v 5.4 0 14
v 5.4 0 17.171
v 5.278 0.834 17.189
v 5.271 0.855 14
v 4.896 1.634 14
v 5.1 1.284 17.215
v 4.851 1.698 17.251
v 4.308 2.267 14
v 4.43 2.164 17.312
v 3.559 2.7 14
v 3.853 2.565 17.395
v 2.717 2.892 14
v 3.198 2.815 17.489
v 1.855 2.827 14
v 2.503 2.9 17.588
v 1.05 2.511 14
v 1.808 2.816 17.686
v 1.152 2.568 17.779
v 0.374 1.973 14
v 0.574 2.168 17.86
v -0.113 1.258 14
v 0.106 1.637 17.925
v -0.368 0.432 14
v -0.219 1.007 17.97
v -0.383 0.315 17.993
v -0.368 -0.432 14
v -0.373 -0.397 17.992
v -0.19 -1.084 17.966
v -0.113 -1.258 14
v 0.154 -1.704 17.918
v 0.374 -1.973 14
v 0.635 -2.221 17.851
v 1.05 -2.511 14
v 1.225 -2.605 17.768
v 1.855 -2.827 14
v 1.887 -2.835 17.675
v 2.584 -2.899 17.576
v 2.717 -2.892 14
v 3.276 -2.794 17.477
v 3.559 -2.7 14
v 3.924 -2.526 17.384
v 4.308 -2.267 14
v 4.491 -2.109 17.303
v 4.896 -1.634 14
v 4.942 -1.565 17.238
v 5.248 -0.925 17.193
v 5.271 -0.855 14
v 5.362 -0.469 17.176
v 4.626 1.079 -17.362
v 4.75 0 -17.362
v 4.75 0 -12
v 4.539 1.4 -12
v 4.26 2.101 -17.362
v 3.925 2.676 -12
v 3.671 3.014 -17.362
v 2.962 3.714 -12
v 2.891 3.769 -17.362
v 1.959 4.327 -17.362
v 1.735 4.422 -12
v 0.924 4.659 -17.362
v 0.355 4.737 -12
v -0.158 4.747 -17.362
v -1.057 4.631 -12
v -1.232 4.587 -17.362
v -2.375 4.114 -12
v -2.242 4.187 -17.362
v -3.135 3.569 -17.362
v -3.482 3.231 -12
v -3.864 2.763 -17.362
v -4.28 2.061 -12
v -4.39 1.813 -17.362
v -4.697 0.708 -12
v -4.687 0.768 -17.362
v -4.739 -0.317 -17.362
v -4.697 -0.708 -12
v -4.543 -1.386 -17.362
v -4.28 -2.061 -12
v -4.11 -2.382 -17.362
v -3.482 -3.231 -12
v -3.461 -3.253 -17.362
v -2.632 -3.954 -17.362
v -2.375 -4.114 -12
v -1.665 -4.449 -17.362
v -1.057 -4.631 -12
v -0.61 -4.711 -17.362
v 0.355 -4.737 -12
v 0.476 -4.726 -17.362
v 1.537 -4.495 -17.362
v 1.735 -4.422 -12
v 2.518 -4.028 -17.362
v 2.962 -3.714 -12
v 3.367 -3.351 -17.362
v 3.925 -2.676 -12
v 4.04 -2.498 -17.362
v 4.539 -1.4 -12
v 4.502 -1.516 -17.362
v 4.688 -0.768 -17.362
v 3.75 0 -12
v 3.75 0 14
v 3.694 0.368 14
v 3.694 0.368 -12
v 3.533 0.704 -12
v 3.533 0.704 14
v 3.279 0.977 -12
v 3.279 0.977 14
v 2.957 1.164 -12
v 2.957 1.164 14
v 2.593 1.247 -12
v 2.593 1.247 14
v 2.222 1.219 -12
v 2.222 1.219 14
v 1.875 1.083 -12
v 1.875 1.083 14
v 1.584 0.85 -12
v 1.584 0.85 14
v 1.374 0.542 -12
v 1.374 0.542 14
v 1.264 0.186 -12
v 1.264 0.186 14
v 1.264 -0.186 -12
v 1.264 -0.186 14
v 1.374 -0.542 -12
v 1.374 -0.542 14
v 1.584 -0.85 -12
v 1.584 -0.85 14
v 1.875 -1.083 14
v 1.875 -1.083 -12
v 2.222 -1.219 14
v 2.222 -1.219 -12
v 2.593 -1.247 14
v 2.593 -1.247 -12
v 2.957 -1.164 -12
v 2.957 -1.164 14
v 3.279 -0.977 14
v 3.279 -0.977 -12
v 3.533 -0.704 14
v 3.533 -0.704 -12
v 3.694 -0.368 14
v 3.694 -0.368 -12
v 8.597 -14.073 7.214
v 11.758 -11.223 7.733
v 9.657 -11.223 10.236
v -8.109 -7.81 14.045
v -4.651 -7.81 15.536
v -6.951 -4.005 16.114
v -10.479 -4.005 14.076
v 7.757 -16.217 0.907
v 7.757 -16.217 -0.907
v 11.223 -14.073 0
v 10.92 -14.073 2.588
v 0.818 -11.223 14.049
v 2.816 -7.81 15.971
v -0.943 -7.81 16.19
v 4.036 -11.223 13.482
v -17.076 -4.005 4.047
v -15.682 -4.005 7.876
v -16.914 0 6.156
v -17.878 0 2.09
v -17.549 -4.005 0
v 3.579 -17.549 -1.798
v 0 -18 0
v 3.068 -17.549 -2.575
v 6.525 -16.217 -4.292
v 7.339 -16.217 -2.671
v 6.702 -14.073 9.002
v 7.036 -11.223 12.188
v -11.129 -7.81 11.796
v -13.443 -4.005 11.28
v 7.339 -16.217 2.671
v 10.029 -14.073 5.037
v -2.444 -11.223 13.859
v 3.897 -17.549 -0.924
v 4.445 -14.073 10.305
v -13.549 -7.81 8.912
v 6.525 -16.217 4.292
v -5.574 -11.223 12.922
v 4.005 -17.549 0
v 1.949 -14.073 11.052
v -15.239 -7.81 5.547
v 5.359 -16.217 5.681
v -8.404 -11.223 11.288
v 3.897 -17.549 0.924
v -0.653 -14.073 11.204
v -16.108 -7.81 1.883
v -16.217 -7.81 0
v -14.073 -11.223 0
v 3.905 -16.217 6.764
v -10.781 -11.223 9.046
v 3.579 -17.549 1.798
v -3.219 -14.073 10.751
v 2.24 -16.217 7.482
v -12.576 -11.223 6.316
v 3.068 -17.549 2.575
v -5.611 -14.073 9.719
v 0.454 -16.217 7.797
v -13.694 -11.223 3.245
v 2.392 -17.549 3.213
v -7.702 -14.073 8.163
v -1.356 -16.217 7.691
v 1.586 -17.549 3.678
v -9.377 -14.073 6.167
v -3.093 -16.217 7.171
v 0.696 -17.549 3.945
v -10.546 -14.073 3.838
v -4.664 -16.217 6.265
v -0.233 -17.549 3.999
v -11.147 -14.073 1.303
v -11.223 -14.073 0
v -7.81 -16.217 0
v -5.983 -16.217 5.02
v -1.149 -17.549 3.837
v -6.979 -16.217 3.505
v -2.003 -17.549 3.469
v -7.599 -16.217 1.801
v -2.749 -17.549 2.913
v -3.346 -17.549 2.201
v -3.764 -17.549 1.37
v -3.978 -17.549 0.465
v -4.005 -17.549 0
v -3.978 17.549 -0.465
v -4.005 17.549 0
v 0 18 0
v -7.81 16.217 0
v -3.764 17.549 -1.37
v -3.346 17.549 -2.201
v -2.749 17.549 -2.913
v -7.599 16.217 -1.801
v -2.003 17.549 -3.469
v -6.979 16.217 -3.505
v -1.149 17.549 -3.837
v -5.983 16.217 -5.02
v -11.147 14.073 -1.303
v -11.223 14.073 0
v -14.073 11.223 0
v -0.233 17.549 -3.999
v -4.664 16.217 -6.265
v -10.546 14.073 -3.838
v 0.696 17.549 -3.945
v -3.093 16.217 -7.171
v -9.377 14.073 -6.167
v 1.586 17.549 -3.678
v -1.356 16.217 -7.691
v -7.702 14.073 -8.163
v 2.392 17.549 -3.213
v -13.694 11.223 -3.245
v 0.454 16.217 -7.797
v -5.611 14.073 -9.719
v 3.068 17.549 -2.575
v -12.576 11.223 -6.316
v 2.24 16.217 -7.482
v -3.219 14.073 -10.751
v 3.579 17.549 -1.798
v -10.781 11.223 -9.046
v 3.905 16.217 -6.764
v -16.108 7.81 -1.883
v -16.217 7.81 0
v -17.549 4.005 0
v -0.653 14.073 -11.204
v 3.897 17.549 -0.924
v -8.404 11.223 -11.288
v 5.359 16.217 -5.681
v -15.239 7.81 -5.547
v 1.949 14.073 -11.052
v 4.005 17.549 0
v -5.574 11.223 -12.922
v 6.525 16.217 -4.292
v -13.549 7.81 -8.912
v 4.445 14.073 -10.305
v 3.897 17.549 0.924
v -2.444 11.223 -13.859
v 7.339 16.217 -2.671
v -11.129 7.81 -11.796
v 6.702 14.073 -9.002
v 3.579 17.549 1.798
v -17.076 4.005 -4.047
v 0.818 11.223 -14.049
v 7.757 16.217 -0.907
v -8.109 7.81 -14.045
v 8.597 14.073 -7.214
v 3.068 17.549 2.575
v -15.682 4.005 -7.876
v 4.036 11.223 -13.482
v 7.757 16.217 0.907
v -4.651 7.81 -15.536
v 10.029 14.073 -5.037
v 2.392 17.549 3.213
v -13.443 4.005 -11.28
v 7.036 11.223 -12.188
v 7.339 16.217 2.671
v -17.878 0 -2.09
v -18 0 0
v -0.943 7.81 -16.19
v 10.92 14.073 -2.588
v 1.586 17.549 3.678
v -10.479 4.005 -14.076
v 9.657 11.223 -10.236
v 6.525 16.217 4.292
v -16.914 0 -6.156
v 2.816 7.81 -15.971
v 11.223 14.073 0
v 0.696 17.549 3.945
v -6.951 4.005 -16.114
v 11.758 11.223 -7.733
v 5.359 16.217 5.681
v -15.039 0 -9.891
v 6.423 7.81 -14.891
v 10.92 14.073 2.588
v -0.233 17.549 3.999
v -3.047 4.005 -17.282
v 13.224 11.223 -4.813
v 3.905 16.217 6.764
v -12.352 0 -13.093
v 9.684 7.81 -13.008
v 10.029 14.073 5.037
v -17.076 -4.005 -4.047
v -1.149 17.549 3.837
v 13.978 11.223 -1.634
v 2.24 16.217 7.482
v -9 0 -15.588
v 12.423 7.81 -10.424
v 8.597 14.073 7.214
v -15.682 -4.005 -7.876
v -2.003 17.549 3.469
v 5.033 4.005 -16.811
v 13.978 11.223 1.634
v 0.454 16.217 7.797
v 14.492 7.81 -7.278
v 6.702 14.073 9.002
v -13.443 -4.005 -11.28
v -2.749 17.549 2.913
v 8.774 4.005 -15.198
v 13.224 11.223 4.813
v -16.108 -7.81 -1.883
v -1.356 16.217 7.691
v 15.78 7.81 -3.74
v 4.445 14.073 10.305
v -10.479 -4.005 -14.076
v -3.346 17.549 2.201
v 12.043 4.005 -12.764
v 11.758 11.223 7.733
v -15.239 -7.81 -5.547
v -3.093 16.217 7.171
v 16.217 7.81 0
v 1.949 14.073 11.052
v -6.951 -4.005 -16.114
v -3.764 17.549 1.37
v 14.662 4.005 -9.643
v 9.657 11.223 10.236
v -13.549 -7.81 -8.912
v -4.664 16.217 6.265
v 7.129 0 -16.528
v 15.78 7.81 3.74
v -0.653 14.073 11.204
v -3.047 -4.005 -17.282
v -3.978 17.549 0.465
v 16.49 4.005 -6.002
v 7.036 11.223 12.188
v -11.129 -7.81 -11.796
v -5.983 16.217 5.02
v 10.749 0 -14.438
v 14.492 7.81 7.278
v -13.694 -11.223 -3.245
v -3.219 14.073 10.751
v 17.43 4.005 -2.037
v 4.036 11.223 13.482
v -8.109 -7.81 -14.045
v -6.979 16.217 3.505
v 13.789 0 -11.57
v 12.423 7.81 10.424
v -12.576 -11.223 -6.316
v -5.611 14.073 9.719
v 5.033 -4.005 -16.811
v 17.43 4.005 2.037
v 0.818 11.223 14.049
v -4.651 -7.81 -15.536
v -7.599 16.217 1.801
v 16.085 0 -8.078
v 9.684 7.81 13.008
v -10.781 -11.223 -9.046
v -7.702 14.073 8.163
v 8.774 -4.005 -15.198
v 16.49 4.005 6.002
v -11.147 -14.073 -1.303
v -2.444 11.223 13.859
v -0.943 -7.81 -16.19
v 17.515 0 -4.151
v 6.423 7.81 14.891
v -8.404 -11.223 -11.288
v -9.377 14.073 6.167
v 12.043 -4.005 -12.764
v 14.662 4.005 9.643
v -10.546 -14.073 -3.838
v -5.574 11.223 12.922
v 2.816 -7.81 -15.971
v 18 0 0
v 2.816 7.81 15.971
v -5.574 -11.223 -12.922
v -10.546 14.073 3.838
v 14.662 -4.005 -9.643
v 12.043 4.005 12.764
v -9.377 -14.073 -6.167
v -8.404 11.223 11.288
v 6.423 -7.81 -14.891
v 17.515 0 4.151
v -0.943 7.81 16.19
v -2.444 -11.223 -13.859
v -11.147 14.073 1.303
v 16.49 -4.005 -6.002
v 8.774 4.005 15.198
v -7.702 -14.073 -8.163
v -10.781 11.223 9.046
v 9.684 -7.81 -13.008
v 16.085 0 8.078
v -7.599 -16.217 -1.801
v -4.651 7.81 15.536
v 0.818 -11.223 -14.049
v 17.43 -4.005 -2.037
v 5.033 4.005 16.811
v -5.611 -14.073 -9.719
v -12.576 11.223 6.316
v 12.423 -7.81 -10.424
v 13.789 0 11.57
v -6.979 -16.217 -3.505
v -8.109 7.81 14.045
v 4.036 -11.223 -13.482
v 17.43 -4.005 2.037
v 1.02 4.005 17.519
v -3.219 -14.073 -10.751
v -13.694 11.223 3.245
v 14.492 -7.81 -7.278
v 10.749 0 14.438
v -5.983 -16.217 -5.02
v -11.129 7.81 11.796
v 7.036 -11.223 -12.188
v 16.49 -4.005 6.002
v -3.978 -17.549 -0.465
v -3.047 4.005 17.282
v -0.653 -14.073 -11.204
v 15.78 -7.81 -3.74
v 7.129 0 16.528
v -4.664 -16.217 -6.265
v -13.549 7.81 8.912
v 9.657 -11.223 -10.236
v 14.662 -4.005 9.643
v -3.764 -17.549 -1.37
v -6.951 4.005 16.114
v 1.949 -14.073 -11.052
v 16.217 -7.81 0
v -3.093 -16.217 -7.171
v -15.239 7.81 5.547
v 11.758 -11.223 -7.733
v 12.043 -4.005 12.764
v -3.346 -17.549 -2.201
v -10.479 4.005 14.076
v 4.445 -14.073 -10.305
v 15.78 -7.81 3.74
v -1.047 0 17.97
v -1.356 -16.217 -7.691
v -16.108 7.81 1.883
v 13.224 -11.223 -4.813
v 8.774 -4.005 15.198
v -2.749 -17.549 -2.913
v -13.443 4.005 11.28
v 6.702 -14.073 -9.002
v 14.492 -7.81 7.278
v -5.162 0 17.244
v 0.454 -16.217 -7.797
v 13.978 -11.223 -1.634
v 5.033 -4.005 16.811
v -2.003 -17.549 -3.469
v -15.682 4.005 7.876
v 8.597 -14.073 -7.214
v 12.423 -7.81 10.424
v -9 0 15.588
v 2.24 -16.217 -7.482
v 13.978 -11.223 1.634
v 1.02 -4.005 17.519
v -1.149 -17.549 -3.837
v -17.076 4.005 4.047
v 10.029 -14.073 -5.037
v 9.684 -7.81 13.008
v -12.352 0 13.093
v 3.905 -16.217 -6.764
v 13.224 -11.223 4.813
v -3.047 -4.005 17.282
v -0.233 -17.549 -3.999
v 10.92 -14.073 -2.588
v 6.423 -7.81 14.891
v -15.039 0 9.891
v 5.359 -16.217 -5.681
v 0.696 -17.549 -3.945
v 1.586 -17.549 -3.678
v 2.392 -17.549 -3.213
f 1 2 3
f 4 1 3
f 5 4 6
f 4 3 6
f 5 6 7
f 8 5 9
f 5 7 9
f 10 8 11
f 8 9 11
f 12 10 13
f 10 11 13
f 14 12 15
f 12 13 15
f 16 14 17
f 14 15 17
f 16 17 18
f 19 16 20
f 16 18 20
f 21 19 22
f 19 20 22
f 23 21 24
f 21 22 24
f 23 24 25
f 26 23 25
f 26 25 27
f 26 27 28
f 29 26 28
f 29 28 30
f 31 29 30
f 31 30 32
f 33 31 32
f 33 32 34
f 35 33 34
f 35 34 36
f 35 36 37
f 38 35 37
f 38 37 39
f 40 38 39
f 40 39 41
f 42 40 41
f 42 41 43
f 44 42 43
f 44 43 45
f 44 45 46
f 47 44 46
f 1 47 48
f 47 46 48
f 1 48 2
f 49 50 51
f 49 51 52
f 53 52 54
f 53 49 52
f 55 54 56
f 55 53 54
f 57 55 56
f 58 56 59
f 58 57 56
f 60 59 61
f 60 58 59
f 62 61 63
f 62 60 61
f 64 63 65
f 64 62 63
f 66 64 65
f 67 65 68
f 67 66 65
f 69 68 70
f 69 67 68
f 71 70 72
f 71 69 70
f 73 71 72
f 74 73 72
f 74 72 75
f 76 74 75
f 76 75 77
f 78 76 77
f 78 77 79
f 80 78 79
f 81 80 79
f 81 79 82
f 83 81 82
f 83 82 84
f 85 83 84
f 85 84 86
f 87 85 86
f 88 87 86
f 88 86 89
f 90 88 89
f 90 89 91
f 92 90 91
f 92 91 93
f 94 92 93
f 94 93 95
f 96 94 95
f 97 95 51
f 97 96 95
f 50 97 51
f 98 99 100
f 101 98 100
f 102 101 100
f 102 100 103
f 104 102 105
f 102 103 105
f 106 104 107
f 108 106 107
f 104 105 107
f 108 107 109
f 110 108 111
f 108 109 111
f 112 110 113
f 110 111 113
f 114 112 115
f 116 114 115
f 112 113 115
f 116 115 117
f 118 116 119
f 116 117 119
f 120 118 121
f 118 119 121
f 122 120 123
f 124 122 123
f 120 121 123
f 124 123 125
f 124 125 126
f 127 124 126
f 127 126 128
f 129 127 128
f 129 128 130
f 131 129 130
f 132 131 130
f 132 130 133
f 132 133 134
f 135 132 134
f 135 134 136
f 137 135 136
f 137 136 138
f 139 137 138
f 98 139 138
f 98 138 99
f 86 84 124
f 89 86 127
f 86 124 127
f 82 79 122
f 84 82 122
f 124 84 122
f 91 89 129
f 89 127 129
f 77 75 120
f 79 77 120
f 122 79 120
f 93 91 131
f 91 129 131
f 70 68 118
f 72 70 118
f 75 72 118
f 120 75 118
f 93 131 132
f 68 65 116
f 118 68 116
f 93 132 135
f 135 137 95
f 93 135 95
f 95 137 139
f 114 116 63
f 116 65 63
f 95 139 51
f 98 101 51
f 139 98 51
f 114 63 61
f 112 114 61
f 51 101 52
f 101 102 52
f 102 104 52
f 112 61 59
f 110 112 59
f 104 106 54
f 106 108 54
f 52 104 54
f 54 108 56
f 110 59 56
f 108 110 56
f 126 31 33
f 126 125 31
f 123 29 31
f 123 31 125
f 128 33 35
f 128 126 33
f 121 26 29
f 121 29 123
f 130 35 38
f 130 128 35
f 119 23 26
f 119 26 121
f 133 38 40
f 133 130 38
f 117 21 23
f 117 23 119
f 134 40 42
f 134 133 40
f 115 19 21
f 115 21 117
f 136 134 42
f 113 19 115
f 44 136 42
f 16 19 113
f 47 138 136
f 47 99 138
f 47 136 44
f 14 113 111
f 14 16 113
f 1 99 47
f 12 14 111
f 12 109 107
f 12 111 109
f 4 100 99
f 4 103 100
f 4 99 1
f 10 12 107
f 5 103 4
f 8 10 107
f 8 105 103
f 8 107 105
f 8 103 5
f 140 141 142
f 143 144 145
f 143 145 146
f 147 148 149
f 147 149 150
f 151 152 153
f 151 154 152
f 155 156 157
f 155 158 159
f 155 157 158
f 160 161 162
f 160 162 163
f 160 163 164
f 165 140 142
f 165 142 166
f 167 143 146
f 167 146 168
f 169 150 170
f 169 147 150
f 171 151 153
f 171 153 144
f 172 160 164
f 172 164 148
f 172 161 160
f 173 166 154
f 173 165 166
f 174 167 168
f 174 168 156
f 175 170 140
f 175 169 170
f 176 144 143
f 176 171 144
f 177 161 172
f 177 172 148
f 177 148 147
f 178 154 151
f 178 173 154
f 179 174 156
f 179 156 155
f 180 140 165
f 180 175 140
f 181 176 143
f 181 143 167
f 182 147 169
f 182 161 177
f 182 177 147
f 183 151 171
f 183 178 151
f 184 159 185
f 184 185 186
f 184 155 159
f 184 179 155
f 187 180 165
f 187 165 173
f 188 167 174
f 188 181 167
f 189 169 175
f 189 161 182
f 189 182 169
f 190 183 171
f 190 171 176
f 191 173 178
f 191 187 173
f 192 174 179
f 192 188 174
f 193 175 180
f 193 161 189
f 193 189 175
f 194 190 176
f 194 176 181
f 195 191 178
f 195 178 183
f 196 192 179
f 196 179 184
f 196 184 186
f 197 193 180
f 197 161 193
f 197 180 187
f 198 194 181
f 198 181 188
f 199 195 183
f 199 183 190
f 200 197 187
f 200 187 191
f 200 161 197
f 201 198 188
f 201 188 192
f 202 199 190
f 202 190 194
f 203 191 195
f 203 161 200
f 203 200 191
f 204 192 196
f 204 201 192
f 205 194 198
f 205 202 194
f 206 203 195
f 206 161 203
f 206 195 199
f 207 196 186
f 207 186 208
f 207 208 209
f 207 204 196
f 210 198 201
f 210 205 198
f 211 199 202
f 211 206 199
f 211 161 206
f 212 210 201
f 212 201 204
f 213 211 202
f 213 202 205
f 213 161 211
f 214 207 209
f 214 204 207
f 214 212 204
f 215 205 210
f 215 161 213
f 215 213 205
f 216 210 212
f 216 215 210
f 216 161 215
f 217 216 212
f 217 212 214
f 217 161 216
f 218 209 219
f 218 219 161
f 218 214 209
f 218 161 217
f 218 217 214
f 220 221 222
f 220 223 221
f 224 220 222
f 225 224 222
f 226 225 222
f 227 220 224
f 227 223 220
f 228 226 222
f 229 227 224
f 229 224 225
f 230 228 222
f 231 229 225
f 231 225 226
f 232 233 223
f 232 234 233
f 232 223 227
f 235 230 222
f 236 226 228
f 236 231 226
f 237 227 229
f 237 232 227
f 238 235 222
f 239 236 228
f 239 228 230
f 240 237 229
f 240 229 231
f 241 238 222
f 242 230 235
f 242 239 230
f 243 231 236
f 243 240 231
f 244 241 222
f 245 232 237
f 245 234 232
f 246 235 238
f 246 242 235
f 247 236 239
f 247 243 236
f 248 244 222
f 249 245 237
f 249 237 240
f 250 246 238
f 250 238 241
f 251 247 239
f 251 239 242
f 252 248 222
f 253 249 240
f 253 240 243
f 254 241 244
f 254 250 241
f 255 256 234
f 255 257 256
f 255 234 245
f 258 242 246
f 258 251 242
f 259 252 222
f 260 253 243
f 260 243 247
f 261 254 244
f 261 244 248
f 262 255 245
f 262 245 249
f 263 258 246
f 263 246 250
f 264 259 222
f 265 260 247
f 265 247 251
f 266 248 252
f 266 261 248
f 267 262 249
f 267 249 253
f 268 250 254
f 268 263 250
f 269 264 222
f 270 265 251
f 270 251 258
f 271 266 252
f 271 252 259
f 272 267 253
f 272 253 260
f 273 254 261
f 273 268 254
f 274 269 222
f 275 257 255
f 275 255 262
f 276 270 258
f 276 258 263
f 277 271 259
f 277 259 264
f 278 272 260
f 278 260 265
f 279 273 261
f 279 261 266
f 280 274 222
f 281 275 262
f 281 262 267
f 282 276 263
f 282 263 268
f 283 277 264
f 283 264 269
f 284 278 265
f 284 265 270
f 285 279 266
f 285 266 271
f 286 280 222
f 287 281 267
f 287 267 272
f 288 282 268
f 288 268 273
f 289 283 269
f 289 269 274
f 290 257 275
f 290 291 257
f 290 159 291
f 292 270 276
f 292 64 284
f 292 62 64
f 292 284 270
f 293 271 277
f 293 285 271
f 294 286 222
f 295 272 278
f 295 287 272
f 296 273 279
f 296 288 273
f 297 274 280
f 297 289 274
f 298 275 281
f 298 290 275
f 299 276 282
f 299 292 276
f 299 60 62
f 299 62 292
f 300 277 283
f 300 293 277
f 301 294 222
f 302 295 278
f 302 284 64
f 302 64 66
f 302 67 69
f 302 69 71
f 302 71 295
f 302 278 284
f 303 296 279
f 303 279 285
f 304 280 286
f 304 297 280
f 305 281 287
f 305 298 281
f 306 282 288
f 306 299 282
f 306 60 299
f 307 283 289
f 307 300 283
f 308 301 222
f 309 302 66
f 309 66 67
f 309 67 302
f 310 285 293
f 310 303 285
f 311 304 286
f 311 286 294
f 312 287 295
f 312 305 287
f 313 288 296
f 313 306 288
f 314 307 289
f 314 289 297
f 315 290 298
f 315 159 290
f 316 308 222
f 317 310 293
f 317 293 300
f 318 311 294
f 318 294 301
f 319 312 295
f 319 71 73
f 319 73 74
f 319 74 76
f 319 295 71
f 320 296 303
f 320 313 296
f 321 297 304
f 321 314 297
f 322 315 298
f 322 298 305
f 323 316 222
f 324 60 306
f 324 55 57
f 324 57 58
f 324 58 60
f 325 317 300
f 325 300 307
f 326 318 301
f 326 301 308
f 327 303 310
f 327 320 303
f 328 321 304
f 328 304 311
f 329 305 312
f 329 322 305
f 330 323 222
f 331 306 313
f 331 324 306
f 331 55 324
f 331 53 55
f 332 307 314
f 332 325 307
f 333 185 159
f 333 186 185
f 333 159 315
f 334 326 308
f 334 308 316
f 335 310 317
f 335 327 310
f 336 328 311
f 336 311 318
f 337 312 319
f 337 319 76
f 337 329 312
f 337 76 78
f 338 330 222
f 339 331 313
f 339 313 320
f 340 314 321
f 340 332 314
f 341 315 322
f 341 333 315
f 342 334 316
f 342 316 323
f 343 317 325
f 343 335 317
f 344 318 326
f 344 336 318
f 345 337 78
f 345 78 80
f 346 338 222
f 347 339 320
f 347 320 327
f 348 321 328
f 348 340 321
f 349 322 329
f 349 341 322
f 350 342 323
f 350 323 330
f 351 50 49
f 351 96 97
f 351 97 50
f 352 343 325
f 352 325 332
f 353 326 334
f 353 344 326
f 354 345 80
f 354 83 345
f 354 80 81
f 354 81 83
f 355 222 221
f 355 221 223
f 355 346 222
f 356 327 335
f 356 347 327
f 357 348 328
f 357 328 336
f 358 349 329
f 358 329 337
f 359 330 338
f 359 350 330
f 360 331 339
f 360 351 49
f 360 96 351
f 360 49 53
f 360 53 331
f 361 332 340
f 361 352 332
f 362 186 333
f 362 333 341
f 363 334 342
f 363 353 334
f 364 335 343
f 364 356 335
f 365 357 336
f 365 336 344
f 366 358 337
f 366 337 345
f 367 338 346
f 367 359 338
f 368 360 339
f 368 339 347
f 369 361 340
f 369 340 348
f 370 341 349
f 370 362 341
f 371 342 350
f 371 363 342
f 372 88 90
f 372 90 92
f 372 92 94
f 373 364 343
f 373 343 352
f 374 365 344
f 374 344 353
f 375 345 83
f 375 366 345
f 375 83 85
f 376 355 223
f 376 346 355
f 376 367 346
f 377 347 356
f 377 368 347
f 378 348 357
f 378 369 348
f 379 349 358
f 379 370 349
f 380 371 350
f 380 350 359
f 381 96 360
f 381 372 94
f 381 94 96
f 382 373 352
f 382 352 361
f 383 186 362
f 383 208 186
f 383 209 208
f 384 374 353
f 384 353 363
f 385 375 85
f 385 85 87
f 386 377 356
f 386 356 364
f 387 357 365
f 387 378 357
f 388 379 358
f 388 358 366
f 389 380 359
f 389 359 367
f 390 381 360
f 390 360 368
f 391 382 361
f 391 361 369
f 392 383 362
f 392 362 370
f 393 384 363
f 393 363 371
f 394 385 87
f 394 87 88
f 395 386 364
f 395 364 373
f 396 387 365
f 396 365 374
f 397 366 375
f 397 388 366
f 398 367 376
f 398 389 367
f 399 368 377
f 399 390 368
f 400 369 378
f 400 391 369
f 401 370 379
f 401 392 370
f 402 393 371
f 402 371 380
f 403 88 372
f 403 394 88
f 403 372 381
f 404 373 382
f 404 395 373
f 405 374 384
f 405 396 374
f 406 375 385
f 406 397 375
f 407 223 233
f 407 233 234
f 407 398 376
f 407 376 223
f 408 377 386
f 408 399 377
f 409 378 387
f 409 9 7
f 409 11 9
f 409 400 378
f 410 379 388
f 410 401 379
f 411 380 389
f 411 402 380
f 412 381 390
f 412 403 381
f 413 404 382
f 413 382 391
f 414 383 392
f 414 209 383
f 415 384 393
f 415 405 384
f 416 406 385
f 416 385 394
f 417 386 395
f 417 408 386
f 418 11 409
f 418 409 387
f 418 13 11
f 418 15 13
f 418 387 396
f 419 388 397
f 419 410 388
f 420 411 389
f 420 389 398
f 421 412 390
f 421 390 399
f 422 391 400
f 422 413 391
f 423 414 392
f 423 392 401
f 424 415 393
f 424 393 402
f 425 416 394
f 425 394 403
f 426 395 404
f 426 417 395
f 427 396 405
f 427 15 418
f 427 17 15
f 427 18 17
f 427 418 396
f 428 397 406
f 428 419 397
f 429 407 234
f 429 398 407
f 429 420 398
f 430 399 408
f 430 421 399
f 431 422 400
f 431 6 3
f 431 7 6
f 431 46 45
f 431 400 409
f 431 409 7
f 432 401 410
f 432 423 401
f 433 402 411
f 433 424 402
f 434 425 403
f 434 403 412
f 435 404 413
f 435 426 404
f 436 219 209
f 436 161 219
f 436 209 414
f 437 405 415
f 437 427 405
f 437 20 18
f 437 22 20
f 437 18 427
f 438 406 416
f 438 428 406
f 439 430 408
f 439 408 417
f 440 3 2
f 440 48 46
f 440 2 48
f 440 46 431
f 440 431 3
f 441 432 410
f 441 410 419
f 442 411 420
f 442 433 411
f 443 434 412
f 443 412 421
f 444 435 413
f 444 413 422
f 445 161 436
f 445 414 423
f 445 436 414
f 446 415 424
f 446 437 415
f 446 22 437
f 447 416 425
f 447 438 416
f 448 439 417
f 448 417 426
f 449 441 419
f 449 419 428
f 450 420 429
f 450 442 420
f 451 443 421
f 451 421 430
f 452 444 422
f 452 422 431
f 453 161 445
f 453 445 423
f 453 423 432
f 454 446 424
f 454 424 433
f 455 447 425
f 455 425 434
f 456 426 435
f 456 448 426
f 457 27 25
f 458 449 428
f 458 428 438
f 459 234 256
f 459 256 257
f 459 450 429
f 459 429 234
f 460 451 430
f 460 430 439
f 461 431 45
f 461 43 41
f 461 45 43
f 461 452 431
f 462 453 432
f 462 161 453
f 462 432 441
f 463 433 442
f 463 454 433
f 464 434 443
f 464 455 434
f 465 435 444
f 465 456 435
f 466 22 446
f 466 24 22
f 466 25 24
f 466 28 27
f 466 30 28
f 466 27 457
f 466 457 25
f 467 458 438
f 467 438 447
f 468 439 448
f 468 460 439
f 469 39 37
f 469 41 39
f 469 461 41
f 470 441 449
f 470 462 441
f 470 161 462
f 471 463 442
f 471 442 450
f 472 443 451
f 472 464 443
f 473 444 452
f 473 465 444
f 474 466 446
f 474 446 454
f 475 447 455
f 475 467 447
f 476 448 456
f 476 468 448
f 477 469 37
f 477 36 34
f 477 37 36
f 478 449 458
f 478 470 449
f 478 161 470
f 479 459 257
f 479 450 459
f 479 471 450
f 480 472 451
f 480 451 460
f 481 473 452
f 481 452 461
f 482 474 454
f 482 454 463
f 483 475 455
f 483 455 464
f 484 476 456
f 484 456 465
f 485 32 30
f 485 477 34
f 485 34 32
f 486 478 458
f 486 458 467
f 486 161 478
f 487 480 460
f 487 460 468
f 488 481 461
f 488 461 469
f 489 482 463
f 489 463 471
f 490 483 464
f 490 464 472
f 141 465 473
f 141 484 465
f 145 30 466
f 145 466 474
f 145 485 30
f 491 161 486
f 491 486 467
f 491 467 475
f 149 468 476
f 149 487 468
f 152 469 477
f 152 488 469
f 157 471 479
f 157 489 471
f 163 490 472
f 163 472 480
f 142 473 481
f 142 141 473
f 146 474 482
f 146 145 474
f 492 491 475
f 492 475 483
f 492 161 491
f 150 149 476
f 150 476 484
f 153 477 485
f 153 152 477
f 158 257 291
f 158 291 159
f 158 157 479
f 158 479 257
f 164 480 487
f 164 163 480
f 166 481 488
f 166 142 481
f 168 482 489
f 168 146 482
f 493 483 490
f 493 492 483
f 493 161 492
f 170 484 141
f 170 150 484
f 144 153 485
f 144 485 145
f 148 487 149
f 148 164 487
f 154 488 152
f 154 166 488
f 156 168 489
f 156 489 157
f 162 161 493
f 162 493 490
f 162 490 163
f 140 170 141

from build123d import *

# Parameters (mm, degrees)
F8_R      = 1.25
F9_DEPTH  = 36.001
F10_R     = 4.75
F10_R_2   = 1.25
F11_DEPTH = 6
F13_R     = 2.9
F14_DEPTH = 4


with BuildPart() as f2:
    # F0 (on Top) → F2 (revolve)
    with BuildSketch(Plane.XY):
        with BuildLine():
            Line((0, -18), (0, 18))
            ThreePointArc((0, 18), (-18, 0), (0, -18))
        make_face()
    revolve(axis=Axis((0, -0.836778, 0), (0, -1, 0)))

    # F8 (on offset) → F9 (cut, through all)
    with BuildSketch(Plane.XY.offset(18)):
        with Locations((2.5, 0)):
            Circle(F8_R)
    extrude(amount=-F9_DEPTH, mode=Mode.SUBTRACT)

    # F10 (on offset) → F11 (cut)
    with BuildSketch(Plane.XY.offset(-18)):
        Circle(F10_R)
        with Locations((2.5, 0)):
            Circle(F10_R_2, mode=Mode.SUBTRACT)
    extrude(amount=F11_DEPTH, mode=Mode.SUBTRACT)

    # F13 (on offset) → F14 (cut)
    with BuildSketch(Plane.XY.offset(18)):
        with Locations((2.5, 0)):
            Circle(F13_R)
    extrude(amount=-F14_DEPTH, mode=Mode.SUBTRACT)


solid = f2.part
